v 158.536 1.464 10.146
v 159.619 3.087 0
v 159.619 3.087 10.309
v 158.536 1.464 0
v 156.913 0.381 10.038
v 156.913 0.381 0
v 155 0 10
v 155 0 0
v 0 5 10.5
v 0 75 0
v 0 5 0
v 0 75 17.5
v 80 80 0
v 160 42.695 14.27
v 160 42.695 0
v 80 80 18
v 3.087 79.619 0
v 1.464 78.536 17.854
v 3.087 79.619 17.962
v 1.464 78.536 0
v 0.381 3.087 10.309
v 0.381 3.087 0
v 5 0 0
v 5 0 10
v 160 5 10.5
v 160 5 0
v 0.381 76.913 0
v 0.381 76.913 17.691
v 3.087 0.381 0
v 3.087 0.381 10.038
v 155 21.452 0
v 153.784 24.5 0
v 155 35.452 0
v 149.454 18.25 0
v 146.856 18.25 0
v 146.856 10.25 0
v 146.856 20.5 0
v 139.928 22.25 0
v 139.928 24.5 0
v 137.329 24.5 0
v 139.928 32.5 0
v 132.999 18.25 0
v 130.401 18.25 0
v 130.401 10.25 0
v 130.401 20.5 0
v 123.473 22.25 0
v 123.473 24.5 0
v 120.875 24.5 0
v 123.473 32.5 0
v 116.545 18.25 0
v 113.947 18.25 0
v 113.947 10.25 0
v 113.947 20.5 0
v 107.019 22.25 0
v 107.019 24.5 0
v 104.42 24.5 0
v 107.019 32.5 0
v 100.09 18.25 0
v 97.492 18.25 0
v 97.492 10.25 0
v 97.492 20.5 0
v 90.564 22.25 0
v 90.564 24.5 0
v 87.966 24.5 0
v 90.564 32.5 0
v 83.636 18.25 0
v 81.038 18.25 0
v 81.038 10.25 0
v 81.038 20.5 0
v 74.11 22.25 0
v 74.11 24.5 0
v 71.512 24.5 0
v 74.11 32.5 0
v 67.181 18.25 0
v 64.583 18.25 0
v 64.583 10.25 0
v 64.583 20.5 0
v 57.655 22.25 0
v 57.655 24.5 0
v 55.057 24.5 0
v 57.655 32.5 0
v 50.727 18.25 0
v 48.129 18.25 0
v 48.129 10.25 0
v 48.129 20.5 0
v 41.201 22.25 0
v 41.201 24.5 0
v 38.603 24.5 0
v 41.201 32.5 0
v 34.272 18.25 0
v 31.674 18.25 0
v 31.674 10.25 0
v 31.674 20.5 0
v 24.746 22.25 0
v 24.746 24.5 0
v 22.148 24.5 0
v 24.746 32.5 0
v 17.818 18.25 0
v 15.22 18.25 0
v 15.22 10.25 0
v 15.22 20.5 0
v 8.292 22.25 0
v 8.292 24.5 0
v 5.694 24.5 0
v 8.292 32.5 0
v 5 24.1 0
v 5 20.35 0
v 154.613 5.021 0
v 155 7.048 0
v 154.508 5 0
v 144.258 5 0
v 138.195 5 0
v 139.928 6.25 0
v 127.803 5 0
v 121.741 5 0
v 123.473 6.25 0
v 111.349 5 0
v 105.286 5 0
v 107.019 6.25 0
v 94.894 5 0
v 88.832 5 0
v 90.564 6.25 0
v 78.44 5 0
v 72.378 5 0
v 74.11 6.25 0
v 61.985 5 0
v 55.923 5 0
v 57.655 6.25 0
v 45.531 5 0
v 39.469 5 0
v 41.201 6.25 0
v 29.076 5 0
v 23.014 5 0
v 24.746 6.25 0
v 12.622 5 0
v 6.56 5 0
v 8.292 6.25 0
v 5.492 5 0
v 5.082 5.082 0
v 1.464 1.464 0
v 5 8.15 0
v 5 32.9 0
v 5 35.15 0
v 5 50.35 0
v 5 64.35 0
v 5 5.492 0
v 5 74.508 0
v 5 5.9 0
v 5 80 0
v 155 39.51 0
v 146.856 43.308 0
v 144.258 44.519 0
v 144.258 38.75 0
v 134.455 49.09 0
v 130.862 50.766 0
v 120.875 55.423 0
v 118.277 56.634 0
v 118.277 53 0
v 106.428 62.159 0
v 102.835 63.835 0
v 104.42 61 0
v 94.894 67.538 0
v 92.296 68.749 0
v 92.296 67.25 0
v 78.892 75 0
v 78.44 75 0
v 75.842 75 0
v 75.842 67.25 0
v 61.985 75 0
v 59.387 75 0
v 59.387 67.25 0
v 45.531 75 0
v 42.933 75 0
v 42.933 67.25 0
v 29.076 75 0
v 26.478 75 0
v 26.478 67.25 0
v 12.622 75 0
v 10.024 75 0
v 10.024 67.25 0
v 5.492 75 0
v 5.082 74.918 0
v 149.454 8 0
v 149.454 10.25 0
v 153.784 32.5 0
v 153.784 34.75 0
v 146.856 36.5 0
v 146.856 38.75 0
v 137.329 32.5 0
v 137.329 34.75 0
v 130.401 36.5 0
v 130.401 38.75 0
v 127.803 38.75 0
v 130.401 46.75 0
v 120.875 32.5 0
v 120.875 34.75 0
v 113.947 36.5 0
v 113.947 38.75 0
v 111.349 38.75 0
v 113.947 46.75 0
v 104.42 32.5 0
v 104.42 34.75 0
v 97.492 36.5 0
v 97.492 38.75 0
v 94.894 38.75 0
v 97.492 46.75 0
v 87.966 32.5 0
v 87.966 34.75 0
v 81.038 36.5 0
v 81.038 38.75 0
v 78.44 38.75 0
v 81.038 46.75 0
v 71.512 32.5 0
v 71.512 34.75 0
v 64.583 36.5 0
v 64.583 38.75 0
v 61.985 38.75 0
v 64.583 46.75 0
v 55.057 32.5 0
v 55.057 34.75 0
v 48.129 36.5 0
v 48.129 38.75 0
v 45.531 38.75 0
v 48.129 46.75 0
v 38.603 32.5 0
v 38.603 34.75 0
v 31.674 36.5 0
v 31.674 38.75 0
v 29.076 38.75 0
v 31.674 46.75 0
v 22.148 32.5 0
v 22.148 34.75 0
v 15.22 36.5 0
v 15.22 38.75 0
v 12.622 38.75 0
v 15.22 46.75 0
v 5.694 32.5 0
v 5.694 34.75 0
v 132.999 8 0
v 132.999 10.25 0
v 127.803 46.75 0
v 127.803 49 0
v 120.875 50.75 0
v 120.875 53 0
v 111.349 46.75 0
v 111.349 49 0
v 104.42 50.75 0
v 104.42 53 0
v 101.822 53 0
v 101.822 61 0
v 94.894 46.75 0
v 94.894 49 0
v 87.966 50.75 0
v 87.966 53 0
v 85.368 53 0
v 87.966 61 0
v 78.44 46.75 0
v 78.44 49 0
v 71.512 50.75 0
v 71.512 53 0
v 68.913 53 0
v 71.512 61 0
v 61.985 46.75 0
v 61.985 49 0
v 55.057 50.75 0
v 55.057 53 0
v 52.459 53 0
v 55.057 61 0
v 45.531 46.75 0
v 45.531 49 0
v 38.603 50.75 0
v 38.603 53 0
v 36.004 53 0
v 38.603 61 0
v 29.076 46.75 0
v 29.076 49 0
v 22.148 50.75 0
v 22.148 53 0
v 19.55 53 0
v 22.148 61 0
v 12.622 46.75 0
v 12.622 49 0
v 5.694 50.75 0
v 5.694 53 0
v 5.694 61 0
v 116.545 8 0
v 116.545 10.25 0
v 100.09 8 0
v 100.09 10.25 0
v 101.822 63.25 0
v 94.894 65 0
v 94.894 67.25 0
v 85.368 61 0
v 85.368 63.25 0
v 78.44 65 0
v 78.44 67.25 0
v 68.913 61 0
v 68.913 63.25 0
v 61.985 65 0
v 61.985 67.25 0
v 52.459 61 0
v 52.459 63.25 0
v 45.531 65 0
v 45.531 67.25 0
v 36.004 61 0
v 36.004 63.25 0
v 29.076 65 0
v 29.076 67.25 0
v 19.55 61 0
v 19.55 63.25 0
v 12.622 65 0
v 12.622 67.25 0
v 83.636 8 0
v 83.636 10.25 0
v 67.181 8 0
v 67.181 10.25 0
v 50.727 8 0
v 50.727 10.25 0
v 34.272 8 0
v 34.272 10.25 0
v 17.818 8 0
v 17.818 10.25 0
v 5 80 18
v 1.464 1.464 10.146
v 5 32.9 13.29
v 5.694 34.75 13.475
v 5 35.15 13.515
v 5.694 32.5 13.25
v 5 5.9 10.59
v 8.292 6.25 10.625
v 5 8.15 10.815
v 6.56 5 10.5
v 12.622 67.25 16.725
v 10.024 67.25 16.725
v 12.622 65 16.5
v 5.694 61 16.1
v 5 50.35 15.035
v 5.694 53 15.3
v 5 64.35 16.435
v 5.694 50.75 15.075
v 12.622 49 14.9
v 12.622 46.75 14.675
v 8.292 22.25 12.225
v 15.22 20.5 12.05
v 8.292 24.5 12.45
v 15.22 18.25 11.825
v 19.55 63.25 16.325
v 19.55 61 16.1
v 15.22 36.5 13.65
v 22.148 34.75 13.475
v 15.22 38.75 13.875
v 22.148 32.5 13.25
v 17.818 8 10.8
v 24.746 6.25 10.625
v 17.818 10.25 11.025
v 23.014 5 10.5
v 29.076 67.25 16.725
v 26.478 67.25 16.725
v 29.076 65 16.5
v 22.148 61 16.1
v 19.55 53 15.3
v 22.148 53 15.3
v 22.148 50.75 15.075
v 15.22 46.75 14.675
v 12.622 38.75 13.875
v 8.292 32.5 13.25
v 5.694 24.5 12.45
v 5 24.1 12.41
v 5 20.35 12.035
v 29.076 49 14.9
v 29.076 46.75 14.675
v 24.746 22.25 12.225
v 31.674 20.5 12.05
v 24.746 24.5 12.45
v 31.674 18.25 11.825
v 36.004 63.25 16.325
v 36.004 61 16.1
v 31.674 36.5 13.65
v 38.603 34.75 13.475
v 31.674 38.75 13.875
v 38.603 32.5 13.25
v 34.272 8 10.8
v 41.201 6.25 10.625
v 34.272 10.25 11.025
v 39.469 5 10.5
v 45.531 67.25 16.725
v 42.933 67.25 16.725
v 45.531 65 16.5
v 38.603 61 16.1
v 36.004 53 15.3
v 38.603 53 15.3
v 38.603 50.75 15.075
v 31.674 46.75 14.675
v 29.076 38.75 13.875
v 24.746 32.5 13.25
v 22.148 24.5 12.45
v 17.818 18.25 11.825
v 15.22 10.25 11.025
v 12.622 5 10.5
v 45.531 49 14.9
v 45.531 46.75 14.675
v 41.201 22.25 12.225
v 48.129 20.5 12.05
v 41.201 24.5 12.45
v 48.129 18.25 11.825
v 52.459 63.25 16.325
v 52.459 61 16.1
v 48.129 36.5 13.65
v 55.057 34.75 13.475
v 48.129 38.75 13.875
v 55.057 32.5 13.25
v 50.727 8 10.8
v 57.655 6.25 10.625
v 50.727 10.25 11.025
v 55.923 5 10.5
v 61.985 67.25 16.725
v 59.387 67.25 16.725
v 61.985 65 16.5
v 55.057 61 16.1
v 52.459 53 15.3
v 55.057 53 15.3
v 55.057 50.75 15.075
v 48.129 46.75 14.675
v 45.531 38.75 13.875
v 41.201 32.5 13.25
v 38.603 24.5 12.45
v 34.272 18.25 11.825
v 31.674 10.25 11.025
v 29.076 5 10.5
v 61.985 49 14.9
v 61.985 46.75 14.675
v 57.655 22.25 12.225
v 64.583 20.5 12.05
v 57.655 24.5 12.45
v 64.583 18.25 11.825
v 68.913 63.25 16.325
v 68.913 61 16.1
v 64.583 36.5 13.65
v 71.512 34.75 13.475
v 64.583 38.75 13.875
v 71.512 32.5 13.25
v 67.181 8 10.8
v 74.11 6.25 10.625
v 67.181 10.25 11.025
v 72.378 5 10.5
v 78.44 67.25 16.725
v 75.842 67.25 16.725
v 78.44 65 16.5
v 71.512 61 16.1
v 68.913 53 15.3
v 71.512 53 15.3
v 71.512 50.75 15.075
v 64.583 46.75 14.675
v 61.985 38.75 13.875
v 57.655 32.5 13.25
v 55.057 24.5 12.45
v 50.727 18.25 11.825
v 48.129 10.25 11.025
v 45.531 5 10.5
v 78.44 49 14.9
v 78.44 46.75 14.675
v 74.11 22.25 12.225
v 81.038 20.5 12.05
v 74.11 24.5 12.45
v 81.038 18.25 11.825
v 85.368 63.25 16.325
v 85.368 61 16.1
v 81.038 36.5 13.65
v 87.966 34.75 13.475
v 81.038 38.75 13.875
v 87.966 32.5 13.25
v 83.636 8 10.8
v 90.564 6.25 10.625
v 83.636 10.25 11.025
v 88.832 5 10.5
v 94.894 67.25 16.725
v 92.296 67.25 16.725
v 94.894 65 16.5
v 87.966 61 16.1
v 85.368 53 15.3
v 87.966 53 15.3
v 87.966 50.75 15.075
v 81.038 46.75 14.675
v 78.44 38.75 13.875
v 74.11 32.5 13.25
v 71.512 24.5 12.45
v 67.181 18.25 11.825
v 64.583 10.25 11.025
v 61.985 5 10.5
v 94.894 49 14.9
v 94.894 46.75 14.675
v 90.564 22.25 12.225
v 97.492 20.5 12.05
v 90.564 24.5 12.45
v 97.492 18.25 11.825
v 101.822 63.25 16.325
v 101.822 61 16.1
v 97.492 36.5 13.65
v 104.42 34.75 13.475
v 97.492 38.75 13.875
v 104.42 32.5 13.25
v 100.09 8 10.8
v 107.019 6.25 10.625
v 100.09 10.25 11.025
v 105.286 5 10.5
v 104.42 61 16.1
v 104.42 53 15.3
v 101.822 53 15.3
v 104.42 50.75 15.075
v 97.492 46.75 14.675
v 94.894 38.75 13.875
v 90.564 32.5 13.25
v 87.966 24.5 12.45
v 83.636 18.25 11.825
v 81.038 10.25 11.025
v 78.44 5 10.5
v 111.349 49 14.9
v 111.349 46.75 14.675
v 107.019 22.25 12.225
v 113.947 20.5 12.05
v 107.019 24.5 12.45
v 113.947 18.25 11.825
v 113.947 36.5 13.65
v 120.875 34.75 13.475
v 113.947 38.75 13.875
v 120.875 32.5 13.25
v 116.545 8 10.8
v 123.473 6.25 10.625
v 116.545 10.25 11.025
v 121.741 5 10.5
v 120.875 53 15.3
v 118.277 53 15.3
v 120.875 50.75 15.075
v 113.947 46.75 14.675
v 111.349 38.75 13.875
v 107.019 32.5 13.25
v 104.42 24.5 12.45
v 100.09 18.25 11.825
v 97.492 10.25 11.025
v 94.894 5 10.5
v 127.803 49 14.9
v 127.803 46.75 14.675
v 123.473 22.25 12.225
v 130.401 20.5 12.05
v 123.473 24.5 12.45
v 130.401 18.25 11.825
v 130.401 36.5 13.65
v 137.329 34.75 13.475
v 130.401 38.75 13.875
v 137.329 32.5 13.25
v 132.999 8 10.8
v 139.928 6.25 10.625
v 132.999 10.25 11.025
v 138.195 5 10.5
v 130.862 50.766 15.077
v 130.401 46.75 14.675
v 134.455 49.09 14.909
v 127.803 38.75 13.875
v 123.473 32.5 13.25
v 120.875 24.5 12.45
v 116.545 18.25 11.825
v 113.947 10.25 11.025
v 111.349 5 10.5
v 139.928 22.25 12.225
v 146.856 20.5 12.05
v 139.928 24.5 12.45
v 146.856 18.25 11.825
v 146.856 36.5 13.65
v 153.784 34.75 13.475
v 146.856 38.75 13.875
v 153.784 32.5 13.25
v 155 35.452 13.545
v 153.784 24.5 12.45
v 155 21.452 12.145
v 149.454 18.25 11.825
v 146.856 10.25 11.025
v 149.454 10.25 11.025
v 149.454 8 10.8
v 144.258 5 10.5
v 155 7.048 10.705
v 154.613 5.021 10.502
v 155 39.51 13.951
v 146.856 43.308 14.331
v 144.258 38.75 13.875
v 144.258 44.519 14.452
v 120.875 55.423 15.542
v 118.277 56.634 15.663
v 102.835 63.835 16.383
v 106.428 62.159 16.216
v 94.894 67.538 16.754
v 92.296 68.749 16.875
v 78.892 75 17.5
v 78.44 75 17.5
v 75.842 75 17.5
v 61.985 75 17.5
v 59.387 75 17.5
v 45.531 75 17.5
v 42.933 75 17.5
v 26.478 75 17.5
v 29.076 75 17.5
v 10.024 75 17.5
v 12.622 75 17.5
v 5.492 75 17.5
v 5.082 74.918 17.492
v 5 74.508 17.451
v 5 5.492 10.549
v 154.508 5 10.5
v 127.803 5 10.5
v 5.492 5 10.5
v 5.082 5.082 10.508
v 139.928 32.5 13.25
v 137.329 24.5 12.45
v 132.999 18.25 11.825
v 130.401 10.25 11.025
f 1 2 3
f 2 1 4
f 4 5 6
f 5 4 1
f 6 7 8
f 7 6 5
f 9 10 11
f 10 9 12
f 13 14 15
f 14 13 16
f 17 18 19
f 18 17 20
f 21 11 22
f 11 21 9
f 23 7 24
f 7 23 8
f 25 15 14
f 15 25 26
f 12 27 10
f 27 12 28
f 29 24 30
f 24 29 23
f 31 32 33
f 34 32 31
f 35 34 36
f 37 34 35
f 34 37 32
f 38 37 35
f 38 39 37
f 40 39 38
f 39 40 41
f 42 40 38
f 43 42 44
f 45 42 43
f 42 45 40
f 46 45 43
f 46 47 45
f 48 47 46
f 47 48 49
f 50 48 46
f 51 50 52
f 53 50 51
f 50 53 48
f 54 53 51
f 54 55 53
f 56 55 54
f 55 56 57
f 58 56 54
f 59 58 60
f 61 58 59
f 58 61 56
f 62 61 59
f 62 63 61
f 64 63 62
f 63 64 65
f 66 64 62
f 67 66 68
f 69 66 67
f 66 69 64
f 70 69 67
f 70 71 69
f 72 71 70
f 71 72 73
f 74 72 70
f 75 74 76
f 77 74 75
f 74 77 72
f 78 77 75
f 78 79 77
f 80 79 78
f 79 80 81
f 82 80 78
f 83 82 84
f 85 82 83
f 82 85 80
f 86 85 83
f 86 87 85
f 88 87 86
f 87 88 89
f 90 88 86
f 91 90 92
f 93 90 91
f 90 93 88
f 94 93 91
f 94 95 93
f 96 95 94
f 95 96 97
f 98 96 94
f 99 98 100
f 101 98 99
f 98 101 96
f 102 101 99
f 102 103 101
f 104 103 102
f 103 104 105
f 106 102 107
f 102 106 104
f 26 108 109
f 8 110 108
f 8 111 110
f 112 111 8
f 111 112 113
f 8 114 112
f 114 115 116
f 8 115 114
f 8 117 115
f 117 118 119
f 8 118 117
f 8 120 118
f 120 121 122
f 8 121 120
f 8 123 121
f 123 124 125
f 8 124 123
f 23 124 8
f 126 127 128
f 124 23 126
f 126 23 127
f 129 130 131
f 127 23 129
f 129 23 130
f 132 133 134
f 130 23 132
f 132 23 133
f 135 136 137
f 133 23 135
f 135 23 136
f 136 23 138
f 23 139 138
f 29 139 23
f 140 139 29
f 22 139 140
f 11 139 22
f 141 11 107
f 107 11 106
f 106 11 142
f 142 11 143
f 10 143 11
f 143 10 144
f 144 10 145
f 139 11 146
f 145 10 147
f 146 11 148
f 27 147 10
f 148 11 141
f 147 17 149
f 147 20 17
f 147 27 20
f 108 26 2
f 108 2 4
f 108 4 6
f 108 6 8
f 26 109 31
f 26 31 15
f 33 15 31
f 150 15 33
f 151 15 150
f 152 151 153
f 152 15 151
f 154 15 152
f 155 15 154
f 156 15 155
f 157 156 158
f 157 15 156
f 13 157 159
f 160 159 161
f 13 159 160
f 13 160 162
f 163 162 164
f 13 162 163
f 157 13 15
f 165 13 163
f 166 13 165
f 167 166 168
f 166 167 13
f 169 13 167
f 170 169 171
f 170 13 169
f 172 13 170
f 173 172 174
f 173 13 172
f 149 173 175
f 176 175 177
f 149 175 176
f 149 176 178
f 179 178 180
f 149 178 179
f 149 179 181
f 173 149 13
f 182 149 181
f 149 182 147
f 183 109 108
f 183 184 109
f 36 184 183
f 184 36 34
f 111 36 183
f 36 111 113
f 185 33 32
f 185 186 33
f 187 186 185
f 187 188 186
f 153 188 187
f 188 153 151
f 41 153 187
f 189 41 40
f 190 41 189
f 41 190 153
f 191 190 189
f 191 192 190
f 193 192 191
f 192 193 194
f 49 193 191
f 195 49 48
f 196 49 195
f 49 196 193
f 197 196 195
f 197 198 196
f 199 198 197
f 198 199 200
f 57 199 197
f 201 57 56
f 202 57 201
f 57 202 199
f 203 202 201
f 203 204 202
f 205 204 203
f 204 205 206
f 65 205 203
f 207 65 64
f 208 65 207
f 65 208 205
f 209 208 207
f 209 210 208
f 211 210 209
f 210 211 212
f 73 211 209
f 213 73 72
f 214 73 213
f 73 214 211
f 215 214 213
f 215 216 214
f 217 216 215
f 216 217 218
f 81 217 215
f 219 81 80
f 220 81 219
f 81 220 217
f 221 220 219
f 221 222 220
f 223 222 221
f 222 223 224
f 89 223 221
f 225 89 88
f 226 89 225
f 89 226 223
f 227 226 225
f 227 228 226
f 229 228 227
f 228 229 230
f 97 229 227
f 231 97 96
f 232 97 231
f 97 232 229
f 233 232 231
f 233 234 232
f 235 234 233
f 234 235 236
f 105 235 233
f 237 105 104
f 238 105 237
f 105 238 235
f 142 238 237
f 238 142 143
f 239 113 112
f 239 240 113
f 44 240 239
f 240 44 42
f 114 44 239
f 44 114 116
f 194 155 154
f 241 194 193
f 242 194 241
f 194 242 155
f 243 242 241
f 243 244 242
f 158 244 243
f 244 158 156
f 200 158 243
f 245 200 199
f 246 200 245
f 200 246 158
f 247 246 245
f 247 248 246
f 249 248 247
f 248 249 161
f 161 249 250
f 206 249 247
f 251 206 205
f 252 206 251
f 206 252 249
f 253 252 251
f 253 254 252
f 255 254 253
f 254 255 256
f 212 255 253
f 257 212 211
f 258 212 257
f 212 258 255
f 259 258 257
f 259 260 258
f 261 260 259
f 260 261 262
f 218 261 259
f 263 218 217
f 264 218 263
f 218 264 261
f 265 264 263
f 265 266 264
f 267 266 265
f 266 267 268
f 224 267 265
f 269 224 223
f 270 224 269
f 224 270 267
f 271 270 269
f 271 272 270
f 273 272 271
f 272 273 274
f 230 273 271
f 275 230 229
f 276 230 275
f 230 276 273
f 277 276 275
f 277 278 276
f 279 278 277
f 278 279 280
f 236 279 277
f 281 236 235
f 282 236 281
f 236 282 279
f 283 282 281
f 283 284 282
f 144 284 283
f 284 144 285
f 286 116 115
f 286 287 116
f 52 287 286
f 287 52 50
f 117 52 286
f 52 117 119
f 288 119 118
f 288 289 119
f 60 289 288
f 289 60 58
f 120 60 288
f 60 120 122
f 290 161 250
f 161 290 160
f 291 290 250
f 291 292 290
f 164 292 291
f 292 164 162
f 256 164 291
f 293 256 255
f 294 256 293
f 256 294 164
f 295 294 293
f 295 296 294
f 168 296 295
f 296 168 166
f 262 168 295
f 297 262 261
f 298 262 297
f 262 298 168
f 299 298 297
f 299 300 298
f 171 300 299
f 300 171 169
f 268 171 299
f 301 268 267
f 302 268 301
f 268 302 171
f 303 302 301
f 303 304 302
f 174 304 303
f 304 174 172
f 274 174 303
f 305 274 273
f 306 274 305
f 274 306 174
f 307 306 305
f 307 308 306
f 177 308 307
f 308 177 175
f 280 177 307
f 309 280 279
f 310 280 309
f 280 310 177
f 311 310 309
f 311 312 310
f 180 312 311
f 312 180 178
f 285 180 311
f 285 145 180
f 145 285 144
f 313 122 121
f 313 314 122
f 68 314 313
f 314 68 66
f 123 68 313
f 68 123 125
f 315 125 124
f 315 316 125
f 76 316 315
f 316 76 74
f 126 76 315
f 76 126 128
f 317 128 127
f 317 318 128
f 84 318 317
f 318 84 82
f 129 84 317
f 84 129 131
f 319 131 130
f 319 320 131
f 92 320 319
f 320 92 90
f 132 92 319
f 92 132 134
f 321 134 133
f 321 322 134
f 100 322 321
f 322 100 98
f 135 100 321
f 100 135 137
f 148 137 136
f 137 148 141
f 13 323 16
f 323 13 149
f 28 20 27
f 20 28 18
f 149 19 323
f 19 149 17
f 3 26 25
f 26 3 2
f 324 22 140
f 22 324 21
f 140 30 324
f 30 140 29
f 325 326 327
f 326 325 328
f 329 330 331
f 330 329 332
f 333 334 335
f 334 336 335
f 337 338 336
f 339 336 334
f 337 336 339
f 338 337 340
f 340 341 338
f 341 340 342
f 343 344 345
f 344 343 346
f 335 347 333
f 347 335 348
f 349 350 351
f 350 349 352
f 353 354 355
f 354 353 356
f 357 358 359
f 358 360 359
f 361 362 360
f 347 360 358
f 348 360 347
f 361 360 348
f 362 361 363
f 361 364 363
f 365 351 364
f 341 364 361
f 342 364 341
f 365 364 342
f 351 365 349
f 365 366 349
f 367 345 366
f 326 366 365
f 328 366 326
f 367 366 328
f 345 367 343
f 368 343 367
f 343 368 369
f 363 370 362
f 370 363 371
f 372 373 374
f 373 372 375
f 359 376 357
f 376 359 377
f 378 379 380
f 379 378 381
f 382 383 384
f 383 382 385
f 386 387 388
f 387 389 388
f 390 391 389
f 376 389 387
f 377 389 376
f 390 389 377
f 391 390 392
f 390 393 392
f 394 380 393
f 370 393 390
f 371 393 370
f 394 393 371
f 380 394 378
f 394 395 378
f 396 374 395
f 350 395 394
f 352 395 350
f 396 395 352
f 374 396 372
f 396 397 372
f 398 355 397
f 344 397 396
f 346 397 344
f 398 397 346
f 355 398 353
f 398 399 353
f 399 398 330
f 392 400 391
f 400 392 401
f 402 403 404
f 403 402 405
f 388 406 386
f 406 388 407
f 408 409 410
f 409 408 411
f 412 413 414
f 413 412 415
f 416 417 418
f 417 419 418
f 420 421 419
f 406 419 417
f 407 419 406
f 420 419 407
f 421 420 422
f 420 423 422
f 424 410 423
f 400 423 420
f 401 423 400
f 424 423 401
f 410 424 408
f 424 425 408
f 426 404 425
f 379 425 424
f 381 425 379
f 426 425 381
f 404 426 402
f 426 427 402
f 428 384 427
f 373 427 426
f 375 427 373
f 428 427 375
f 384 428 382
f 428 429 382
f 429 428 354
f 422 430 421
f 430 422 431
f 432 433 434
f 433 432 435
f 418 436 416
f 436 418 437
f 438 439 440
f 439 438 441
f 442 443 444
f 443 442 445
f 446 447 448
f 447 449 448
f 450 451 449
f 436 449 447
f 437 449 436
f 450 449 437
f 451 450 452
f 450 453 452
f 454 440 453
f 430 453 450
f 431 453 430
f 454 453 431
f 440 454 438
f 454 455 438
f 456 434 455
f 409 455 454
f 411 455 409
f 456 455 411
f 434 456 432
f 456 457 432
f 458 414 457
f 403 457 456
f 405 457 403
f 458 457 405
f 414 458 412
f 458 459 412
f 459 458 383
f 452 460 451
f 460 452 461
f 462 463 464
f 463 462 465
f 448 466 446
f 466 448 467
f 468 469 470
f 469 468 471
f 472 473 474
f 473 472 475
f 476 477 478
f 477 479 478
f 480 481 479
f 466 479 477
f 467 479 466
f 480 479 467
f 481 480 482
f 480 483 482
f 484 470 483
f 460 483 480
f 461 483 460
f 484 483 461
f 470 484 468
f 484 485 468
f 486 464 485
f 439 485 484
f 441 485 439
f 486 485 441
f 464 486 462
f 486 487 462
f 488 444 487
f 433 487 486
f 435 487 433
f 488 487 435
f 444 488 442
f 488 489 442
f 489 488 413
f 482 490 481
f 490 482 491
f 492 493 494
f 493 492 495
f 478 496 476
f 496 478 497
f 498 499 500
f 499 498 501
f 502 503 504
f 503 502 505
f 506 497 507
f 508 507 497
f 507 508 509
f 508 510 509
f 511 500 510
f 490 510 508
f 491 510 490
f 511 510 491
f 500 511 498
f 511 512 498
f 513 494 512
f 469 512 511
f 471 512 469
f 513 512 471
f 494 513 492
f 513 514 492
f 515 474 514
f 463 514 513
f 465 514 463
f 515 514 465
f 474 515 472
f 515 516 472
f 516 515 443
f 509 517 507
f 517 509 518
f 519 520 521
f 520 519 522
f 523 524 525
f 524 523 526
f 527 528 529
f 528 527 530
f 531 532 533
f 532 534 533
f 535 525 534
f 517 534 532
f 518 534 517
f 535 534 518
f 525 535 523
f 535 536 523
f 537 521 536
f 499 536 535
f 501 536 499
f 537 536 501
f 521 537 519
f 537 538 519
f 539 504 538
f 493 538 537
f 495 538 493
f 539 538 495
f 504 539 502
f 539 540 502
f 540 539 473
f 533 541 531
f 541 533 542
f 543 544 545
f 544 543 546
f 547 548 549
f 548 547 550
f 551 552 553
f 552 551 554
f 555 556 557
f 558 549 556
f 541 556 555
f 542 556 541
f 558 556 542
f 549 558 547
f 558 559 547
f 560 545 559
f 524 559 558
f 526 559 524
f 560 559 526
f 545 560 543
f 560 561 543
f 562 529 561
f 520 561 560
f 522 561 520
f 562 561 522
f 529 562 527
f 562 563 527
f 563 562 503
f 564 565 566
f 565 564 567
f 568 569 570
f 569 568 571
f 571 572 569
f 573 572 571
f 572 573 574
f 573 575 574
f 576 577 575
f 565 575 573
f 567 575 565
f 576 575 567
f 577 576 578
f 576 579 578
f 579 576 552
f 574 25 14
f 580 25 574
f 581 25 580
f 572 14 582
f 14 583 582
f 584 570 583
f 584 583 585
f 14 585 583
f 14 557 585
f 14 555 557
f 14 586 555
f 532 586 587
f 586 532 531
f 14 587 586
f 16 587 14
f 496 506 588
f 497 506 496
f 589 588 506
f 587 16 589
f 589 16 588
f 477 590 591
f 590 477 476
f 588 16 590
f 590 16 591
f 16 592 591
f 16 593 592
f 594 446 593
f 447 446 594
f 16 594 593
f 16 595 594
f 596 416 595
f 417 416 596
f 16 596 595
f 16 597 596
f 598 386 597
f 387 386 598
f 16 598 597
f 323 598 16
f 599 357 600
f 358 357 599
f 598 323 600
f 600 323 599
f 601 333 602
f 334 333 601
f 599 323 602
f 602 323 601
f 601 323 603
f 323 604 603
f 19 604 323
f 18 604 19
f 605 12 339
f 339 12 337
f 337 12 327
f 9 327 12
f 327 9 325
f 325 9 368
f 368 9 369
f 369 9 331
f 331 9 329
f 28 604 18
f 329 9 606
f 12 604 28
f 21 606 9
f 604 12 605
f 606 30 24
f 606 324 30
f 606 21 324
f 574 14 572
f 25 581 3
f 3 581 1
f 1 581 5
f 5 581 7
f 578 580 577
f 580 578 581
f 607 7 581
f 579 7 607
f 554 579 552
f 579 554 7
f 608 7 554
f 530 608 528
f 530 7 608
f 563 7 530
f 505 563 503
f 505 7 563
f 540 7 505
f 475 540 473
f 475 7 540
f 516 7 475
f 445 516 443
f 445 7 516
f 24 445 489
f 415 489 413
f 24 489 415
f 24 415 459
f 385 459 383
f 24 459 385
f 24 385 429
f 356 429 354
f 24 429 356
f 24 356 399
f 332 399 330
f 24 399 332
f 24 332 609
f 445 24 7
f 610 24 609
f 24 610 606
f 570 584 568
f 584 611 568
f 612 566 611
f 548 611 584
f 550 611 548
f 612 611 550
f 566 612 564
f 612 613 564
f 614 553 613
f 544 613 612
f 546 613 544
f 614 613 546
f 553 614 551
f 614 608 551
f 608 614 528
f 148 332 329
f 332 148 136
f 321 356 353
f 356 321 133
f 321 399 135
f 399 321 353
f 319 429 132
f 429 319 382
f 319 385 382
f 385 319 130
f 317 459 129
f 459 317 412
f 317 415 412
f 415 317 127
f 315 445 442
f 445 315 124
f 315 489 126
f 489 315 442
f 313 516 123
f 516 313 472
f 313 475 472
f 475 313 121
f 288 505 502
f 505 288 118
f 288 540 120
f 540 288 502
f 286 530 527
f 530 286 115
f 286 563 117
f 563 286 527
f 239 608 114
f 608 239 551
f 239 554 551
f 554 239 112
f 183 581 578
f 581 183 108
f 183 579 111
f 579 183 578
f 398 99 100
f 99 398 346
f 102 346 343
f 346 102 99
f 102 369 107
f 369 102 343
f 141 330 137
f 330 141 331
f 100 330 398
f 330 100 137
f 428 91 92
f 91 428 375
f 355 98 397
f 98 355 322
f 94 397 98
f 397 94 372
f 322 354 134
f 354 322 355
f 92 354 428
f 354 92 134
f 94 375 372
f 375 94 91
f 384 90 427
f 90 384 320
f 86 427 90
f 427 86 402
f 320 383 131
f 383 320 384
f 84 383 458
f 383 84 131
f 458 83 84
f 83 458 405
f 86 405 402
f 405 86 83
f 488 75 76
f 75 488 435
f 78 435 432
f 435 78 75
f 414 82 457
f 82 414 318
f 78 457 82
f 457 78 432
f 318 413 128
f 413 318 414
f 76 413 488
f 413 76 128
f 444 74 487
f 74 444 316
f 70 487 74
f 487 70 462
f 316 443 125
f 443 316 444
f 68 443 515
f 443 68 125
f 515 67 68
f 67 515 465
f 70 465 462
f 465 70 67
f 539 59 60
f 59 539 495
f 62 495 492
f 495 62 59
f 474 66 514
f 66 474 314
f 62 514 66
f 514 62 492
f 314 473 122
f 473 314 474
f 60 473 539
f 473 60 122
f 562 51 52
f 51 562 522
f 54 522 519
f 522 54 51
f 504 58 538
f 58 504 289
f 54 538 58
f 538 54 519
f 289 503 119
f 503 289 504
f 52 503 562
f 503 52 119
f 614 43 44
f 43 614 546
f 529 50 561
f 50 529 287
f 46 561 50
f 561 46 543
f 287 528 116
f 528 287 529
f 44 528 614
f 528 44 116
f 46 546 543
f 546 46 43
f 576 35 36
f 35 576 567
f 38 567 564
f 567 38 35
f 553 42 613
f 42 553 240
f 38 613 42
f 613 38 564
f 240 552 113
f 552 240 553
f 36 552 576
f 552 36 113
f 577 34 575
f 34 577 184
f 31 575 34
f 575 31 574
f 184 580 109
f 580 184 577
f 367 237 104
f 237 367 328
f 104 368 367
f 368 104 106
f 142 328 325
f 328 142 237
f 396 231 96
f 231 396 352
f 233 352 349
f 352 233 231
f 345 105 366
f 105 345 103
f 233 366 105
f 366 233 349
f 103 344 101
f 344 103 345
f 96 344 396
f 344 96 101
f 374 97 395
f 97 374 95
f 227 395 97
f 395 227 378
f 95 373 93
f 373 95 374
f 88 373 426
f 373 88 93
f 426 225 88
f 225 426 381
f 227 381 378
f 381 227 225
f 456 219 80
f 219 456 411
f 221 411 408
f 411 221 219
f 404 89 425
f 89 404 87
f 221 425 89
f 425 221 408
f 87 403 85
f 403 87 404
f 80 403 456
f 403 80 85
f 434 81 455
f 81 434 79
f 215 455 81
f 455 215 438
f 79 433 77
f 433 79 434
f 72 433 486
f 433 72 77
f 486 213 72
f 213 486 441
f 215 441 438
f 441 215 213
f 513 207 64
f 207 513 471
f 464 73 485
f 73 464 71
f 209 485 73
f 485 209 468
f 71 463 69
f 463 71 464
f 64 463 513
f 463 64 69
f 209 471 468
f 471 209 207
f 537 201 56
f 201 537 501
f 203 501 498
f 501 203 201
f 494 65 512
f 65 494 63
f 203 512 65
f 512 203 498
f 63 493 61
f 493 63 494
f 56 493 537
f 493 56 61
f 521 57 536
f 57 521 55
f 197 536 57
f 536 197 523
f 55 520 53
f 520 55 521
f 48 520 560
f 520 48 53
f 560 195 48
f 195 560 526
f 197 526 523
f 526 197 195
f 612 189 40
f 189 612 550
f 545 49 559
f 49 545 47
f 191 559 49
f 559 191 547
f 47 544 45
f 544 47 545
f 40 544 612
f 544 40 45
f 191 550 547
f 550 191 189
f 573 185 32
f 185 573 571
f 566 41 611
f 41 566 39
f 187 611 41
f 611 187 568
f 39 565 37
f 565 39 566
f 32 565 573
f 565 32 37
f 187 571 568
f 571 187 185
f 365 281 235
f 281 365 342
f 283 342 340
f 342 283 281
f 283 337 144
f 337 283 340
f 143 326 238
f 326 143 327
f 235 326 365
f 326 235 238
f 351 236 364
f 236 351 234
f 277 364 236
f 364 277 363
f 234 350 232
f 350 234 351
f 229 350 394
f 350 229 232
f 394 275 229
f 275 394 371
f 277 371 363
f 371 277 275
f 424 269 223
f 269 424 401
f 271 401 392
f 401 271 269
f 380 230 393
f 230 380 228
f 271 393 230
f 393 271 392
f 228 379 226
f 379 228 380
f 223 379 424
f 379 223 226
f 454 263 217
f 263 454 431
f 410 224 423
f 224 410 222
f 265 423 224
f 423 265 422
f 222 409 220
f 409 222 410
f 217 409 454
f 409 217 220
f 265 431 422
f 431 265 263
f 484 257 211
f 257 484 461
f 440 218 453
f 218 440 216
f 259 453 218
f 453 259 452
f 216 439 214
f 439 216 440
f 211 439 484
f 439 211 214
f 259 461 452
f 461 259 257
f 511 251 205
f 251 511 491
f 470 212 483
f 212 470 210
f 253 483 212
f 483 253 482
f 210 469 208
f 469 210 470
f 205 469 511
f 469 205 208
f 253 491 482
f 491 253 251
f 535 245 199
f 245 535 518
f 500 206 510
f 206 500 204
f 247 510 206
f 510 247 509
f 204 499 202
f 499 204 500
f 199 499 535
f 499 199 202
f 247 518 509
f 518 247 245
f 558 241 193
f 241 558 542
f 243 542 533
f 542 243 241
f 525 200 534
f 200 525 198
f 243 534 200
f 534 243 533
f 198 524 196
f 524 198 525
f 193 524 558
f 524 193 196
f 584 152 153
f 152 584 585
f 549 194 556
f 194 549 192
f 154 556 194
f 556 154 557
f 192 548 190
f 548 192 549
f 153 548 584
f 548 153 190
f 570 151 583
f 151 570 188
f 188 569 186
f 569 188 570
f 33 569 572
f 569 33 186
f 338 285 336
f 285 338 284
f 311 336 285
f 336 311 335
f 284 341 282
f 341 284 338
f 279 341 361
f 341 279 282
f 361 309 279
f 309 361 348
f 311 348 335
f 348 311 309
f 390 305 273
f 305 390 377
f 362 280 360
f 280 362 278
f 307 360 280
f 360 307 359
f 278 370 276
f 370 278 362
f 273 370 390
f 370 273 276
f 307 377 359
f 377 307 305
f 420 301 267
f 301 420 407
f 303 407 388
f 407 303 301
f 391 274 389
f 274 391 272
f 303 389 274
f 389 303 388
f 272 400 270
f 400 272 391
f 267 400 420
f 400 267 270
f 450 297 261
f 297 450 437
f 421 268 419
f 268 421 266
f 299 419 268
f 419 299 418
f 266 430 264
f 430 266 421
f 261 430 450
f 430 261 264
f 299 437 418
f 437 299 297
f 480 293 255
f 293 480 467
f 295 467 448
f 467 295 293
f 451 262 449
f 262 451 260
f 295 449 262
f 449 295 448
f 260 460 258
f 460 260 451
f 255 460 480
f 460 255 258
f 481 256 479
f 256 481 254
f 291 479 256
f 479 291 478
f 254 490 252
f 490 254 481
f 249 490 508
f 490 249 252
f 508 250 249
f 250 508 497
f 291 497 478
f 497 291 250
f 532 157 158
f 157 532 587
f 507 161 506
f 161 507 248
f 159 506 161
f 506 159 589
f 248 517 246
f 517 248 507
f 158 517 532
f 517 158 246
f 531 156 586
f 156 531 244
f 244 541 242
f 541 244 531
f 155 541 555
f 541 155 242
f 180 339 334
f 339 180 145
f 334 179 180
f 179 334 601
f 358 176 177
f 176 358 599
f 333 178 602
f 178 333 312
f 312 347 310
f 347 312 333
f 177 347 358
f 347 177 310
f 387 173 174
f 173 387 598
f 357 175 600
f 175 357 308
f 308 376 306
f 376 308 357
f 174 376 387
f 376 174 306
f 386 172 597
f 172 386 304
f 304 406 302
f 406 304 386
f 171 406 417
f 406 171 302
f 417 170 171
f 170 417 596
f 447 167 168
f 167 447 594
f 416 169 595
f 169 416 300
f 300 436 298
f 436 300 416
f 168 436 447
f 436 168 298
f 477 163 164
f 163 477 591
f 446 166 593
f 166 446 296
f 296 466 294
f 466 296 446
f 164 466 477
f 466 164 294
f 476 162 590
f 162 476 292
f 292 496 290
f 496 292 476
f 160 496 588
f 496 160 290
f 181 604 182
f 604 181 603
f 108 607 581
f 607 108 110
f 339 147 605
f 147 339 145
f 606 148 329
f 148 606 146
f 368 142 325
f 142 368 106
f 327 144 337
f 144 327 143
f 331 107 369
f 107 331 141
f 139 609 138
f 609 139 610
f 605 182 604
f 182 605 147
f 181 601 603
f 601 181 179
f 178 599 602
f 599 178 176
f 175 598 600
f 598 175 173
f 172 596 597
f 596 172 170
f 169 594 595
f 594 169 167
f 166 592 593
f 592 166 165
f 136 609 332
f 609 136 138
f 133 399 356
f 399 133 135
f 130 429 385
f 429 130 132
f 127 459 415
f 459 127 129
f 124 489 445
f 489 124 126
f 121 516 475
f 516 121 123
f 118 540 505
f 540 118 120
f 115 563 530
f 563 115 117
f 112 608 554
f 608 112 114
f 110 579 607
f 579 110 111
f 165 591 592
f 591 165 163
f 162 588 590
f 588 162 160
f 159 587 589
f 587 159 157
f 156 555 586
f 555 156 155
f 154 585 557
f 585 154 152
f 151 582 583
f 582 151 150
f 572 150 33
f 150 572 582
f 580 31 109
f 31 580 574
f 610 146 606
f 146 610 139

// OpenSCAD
/* [Slab] */
// Front elevation in mm
slab_front = 10;
// Back elevation in mm
slab_back = 18;
// width in mm
slab_width = 160;
// height in mm
slab_height = 80;
// Corner radius in mm
slab_roundness = 5;

/* [Hexa grid] */
// Size of an hexagon
grid_size = 8;
// width in mm
grid_width = 1.5;

/* [Border] */
// Border width in mm
border_width = 5;

/* [ergodox] */
// Ergodox wrist pad? (mirror the part in your slicer to obtain a right pad)
ergodox_type = "left"; // [left, none]
// Offset of the thumb part, in mm
ergodox_thumb_offset = 80;

/* [Hidden] */
fudge = 0.001;

module hexgrid(lines=5, rows=10, height=15, hexsize=5, width=2) {
    for (i = [0:lines]) {
        for (j = [0:rows]) {
            translate([sqrt(3)*(hexsize+width)*j+sqrt(3)/2*i*hexsize, 3/4*2*(hexsize+width)*i, -fudge]) rotate([0, 0, 90])
            cylinder(h=height, d=hexsize*2, $fn=6);
        }
    }
}

module pad_base(width, height, roundness, type="none") {
    difference() {
        union() {
            translate([roundness, 0]) square([width-2*roundness, height]);
            translate([0, roundness]) square([width, height-2*roundness]);
            translate([roundness, roundness]) circle(r=roundness);
            translate([width-roundness, roundness]) circle(r=roundness);
            translate([roundness, height-roundness]) circle(r=roundness);
            translate([width-roundness, height-roundness]) circle(r=roundness);
        };
        if (type == "left") {
            translate([ergodox_thumb_offset, height]) rotate(-25) square([width, height]);
        }
    }
}

module slab(width=160, height=80, zfront=10, zback=18, roundness=5) {
    angle = atan(abs(zback-zfront)/height);
    cube_size = 2*max(width, height);
    difference() {
        linear_extrude(max(zfront, zback)+fudge) { pad_base(width, height, roundness, ergodox_type); };
        // Inclination
        translate([-width/2, 0, min(zfront, zback)]) rotate([angle, 0, 0]) cube(cube_size);
    }
}

module wristpad() {
    grid_lines = ceil(slab_height/(3/4*2*(grid_size+grid_width)));
    // Add (grid_lines*grid_size to compensate shifting
    grid_rows = ceil((slab_width+grid_lines*grid_size)/(sqrt(3)*(grid_size+grid_width)));

    difference() {
        slab(width=slab_width, height=slab_height, zfront=slab_front, zback=slab_back, roundness=slab_roundness);
        // Inner grid
        intersection() {
            // Compensate shift on each line
            translate([-grid_lines*grid_size, 0, 0])
            hexgrid(hexsize=grid_size, width=grid_width, height=max(slab_front, slab_back), lines=grid_lines, rows=grid_rows);
            // Inner grid
            translate([0, 0, -fudge])
            linear_extrude(max(slab_front, slab_back)+2*fudge) {
                offset(r=-border_width) pad_base(slab_width, slab_height, slab_roundness, ergodox_type);
            }
        }
    }
}

wristpad();
